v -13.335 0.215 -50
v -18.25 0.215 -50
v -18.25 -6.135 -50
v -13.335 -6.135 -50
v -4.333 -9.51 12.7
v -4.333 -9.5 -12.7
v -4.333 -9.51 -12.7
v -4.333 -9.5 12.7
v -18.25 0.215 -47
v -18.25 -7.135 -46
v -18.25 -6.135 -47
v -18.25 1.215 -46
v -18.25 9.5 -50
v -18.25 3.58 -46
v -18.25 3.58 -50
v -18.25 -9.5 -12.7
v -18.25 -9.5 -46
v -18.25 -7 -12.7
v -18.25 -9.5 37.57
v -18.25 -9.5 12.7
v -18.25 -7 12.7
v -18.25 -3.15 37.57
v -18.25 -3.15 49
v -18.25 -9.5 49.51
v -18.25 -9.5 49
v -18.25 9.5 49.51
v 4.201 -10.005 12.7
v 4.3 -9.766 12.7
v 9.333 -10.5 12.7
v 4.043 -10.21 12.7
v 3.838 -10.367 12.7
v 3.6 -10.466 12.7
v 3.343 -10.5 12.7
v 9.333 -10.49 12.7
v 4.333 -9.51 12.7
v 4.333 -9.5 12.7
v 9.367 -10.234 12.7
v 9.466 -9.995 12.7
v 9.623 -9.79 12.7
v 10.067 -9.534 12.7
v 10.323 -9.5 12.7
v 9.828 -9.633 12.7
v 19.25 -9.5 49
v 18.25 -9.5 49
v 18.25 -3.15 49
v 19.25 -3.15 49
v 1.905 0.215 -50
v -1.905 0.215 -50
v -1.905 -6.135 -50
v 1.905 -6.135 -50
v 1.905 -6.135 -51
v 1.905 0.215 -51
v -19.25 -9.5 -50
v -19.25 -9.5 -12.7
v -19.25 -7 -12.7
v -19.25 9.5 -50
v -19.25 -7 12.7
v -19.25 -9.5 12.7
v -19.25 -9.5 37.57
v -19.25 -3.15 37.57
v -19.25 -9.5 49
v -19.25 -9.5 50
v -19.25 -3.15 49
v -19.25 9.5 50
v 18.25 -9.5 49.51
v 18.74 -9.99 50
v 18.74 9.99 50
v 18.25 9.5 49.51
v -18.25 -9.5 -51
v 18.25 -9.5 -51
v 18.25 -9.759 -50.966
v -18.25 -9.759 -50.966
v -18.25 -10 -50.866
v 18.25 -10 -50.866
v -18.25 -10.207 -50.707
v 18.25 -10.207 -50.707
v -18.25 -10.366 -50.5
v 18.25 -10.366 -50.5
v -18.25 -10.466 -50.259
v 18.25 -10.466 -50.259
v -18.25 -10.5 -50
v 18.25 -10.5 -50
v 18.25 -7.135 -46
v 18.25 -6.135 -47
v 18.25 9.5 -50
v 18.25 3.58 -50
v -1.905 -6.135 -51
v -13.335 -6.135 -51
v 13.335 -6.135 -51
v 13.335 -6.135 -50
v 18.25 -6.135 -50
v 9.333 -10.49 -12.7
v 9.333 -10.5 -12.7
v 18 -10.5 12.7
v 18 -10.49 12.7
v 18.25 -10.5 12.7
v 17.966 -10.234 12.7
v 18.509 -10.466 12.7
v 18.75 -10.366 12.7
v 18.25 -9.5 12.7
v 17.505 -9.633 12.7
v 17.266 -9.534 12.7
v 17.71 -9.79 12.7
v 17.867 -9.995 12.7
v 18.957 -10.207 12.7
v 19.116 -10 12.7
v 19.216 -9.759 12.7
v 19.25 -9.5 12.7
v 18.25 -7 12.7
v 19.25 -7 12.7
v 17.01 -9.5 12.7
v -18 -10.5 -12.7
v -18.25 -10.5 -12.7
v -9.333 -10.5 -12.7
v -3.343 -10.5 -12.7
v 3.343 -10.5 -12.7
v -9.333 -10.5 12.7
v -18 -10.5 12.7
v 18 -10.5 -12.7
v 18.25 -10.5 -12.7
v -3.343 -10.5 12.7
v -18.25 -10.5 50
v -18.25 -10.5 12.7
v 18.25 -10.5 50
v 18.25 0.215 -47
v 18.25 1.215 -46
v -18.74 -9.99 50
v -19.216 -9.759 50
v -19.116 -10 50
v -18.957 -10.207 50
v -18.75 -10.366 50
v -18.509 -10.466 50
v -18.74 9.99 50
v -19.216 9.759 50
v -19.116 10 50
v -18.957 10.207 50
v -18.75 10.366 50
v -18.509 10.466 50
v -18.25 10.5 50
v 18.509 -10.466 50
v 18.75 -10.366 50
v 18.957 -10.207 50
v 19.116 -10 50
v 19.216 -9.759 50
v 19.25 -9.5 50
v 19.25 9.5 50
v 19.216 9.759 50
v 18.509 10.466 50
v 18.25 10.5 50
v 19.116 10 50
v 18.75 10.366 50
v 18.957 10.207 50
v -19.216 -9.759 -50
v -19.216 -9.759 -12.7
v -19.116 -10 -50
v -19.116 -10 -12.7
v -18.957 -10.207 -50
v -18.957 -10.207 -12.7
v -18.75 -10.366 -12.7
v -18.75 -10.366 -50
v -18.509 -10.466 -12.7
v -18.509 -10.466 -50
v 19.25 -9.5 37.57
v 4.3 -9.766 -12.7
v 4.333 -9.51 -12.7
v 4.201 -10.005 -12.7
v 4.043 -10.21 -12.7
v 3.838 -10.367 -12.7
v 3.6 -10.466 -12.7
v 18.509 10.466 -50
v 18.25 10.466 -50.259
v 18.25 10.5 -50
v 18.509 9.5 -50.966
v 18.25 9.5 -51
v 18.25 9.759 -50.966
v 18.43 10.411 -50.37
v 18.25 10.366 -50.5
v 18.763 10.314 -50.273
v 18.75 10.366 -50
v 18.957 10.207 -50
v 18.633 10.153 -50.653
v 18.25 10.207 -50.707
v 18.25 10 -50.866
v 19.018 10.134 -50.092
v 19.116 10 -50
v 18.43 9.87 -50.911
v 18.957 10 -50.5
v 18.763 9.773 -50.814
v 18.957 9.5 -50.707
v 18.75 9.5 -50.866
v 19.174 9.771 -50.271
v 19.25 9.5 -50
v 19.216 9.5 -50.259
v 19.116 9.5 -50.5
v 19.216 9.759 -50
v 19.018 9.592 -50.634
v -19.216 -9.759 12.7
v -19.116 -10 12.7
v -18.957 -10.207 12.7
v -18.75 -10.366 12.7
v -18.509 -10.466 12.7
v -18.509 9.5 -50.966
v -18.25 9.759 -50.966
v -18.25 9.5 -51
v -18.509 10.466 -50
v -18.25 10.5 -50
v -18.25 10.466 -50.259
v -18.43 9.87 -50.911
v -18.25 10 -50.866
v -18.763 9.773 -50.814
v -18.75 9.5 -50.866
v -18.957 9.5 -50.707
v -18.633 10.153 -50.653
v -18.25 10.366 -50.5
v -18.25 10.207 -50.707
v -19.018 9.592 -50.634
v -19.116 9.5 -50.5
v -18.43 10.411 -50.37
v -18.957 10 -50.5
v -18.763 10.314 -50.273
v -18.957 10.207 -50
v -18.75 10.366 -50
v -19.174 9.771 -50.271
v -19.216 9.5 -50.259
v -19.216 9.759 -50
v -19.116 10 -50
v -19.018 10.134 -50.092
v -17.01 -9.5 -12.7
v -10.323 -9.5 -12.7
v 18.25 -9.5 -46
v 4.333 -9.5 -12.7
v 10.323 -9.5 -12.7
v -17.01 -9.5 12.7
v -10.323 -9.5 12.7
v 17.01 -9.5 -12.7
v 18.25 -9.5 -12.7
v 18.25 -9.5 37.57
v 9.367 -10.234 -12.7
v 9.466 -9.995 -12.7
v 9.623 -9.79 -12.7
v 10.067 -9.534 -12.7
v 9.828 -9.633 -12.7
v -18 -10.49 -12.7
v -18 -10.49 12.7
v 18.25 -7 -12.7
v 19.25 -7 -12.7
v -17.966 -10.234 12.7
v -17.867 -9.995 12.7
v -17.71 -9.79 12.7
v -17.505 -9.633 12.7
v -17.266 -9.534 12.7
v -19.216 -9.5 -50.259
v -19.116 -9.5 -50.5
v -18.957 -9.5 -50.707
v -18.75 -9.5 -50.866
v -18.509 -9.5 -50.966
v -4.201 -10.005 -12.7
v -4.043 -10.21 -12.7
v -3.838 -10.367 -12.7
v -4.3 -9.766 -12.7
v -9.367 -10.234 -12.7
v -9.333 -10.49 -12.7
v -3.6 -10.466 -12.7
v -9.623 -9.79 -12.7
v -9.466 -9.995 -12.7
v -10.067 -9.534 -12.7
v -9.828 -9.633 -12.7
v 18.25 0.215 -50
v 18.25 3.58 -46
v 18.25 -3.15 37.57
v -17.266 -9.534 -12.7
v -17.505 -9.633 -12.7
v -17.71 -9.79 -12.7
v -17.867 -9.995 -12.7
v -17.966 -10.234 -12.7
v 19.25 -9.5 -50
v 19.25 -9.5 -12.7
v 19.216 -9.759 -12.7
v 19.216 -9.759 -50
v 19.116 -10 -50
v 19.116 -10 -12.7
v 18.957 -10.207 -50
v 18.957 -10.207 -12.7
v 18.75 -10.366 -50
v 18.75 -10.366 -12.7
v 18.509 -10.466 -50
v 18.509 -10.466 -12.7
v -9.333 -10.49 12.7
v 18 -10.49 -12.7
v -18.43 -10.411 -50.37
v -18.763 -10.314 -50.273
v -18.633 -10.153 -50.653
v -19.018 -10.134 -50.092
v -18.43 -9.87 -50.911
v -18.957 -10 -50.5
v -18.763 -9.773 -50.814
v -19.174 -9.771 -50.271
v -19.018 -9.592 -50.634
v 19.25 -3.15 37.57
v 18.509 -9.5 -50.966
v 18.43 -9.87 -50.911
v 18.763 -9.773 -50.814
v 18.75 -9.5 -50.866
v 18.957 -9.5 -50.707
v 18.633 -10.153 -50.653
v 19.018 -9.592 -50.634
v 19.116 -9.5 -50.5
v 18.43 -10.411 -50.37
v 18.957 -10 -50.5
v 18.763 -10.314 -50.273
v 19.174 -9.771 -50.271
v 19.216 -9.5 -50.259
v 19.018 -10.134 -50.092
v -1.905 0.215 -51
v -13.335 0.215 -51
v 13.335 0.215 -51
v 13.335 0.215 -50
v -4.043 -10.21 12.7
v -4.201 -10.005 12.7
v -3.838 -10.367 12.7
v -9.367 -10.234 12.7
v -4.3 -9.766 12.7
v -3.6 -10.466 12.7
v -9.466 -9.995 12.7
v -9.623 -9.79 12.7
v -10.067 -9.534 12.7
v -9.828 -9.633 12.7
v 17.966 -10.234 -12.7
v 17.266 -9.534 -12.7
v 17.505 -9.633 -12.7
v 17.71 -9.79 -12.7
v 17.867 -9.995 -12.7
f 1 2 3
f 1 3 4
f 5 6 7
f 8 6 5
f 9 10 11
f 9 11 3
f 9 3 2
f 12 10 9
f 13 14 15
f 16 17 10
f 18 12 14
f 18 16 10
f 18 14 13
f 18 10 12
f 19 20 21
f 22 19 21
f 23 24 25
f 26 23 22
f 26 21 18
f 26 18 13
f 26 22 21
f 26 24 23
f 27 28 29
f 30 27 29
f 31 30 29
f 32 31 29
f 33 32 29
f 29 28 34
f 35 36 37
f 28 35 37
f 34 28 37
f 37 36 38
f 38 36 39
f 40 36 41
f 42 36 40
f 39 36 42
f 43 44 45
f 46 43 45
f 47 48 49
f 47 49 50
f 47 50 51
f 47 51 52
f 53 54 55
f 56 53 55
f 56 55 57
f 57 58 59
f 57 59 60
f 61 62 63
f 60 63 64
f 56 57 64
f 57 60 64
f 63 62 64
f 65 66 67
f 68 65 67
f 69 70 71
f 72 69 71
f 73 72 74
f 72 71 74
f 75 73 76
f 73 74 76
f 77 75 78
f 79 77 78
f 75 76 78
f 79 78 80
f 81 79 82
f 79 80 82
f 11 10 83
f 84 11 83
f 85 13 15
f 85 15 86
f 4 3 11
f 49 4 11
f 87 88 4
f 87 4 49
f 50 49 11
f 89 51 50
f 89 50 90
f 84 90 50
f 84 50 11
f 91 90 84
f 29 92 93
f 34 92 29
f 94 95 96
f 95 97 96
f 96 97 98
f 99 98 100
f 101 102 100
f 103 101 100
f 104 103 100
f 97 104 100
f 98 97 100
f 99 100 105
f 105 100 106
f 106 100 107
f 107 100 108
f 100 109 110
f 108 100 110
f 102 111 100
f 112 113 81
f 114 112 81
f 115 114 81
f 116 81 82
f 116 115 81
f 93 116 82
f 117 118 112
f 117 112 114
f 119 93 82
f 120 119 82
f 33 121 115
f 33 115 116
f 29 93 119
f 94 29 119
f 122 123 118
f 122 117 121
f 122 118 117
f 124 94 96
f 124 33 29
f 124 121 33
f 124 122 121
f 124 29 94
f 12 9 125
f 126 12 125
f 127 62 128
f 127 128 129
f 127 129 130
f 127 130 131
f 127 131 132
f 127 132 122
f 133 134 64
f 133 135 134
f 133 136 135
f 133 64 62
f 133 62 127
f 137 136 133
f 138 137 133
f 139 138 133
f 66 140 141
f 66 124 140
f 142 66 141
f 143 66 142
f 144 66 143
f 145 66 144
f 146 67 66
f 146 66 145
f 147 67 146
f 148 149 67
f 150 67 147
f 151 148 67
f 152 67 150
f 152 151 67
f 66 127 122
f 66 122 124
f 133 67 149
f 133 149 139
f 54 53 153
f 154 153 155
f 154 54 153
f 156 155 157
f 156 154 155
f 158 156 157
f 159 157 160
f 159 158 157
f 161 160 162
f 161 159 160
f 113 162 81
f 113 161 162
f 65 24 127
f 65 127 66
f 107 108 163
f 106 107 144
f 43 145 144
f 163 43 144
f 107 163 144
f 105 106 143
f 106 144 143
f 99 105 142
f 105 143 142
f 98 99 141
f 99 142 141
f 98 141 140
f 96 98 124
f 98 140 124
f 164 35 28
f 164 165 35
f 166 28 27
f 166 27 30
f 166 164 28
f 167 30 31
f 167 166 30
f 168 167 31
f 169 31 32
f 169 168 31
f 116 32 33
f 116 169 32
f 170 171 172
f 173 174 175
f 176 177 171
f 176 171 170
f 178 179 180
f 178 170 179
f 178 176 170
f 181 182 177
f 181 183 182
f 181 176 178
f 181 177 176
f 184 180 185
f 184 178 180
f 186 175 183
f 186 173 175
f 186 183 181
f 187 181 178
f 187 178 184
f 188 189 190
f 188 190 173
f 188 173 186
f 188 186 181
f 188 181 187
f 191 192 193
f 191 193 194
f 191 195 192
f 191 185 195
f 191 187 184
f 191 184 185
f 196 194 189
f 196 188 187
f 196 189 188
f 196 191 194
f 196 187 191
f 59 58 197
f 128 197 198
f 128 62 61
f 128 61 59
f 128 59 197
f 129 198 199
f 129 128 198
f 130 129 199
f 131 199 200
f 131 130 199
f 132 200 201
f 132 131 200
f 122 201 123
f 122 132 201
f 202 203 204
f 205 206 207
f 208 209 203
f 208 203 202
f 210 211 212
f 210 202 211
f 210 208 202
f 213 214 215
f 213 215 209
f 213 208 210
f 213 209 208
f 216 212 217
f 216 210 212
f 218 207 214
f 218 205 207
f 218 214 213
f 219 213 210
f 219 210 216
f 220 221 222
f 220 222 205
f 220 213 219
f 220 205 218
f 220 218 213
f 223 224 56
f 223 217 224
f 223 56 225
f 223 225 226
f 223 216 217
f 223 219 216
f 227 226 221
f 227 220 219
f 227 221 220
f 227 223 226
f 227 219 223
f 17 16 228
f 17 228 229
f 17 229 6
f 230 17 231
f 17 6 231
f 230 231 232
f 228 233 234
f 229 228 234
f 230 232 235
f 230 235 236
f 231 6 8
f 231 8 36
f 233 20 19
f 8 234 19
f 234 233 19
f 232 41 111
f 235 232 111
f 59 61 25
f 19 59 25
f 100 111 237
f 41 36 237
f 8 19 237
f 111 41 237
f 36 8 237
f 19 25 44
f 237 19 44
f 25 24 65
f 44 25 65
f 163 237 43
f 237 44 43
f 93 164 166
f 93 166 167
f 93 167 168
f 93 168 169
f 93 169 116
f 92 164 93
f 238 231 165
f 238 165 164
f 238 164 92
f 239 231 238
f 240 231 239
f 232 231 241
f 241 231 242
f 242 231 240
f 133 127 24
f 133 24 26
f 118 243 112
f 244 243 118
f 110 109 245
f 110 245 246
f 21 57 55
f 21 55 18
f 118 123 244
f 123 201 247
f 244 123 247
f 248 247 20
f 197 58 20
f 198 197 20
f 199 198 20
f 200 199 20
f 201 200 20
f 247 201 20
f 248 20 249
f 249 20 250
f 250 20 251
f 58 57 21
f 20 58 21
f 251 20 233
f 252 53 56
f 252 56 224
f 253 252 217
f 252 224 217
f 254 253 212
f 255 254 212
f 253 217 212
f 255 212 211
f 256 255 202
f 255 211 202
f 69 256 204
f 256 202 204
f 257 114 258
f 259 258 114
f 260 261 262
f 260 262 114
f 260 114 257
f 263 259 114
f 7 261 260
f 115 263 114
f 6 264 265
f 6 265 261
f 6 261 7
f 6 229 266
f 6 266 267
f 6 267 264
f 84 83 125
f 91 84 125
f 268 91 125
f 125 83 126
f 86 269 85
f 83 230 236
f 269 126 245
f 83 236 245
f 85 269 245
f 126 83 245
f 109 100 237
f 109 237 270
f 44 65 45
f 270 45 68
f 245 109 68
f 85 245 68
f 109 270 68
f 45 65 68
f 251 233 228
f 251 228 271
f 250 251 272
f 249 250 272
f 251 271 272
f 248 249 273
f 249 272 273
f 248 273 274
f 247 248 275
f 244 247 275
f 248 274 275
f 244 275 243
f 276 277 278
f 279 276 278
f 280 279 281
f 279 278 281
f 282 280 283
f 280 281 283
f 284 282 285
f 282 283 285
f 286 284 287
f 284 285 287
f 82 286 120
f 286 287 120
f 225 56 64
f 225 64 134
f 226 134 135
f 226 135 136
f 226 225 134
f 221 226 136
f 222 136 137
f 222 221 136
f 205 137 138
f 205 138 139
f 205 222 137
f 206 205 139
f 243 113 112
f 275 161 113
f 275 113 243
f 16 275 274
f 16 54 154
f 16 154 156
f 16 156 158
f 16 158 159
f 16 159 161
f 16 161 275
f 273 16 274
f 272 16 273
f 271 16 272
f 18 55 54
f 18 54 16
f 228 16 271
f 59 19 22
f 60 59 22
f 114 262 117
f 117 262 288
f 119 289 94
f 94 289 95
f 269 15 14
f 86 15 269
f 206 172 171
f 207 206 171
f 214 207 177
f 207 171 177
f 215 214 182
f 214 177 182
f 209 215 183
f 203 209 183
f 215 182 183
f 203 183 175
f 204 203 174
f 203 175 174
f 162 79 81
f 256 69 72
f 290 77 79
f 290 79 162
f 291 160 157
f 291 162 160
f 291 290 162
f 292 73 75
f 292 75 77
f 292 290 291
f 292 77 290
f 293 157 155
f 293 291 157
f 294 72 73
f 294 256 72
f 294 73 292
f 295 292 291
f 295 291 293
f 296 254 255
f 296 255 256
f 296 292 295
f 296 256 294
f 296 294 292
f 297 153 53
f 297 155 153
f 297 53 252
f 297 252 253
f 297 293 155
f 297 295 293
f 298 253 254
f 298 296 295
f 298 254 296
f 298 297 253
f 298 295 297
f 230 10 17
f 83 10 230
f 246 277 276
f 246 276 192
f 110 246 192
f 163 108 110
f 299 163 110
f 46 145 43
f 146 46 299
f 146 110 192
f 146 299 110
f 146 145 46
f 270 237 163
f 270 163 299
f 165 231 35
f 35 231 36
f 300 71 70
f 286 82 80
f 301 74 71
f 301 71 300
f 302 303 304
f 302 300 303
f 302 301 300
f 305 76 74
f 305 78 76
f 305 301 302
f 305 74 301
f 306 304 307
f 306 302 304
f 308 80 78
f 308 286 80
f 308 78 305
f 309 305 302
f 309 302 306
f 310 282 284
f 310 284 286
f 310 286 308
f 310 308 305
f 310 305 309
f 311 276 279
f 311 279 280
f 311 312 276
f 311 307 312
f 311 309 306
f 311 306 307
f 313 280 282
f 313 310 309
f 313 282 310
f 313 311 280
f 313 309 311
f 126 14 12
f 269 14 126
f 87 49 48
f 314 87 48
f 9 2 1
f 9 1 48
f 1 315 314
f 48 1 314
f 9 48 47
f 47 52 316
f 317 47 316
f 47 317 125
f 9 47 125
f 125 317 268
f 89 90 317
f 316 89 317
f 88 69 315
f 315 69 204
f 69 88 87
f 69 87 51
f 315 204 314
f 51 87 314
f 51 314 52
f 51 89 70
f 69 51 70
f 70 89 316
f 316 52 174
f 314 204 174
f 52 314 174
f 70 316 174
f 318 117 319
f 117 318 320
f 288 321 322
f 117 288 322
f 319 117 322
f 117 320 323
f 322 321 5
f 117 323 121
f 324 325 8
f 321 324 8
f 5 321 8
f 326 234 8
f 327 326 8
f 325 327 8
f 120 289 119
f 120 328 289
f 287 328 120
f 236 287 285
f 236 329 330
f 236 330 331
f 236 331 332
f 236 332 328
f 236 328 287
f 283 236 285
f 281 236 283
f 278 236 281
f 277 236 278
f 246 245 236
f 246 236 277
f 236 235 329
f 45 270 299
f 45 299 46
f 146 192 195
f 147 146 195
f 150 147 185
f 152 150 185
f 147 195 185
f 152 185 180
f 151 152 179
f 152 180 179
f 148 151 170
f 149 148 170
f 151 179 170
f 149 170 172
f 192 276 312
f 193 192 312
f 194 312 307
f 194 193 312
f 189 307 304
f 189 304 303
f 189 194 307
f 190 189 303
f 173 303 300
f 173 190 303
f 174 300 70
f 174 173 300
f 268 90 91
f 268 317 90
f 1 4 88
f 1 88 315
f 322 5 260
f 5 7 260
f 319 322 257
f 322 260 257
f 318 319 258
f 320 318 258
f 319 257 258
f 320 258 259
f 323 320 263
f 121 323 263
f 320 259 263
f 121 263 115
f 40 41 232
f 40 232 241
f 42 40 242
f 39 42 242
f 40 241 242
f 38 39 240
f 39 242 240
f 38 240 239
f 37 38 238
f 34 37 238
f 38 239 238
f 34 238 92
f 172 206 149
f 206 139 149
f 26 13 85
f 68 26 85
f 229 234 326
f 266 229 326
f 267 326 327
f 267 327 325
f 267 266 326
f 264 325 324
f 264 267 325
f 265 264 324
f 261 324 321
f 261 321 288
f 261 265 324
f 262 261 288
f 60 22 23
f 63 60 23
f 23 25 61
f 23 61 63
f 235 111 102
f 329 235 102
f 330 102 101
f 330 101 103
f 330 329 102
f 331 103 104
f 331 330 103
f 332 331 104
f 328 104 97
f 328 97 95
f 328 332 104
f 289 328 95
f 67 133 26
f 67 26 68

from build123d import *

# Parameters (mm, degrees)
SKETCH020_W          = 36.5
SKETCH020_H          = 19
PAD015_DEPTH         = 50
THICKNESS003_T       = 1
SKETCH021_W          = 11.43
SKETCH021_H          = 6.35
POCKET003_DEPTH      = 51.001
SKETCH022_W          = 6.35
SKETCH022_H          = 11.43
POCKET004_DEPTH      = 19.251
POCKET004_DEPTH_BACK = 19.251
SKETCH028_W          = 10
SKETCH028_H          = 25.4
SKETCH028_W_2        = 5
POCKET005_DEPTH      = 5
FILLET006_R          = 0.99
SKETCH034_W          = 36.5
SKETCH034_H          = 3.365
PAD021_DEPTH         = 4
CHAMFER_SIZE         = 1
CHAMFER001_SIZE      = 0.49


with BuildPart() as part:
    # Sketch020 → Pad015 (new body, symmetric)
    with BuildSketch(Plane.XY):
        Rectangle(SKETCH020_W, SKETCH020_H)
    extrude(amount=PAD015_DEPTH, both=True)

    # Thickness003
    thickness003_openings = [part.faces().sort_by_distance(p)[0] for p in [
        (0, 0, 50),
    ]]
    offset(amount=THICKNESS003_T, openings=thickness003_openings)

    # Sketch021 → Pocket003 (cut, through all)
    with BuildSketch(Plane.XY):
        with Locations((7.62, -2.96)):
            Rectangle(SKETCH021_W, SKETCH021_H)
        with Locations((-7.62, -2.96)):
            Rectangle(SKETCH021_W, SKETCH021_H)
    extrude(amount=-POCKET003_DEPTH, mode=Mode.SUBTRACT)

    # Sketch022 → Pocket004 (cut, two sides)
    with BuildSketch(Plane.YZ) as pocket004_sk:
        with Locations((-6.325, 43.285)):
            Rectangle(SKETCH022_W, SKETCH022_H)
    extrude(amount=-POCKET004_DEPTH, mode=Mode.SUBTRACT)
    extrude(pocket004_sk.sketch, amount=POCKET004_DEPTH_BACK, mode=Mode.SUBTRACT)

    # Sketch028 → Pocket005 (cut)
    with BuildSketch(Plane.XZ.offset(7)):
        with Locations((-23, 0)):
            Rectangle(SKETCH028_W, SKETCH028_H)
        with Locations((23, 0)):
            Rectangle(SKETCH028_W, SKETCH028_H)
        with Locations((-6.833333, 0)):
            Rectangle(SKETCH028_W_2, SKETCH028_H)
        with Locations((6.833333, 0)):
            Rectangle(SKETCH028_W_2, SKETCH028_H)
    extrude(amount=POCKET005_DEPTH, mode=Mode.SUBTRACT)

    # Fillet006
    fillet006_edges = [part.edges().sort_by_distance(p)[0] for p in [
        (-18, -9.5, 0),
        (-9.333333, -9.5, 0),
        (-4.333333, -10.5, 0),
        (4.333333, -10.5, 0),
        (9.333333, -9.5, 0),
        (18, -9.5, 0),
    ]]
    fillet(fillet006_edges, radius=FILLET006_R)

    # Sketch034 → Pad021 (join)
    with BuildSketch(Plane.XY.offset(-50)):
        with Locations((0, -7.8175)):
            Rectangle(SKETCH034_W, SKETCH034_H)
        with Locations((0, 1.8975)):
            Rectangle(SKETCH034_W, SKETCH034_H)
    extrude(amount=PAD021_DEPTH)

    # Chamfer
    chamfer_edges = [part.edges().sort_by_distance(p)[0] for p in [
        (0, 0.215, -46),
        (0, -6.135, -46),
    ]]
    chamfer(chamfer_edges, length=CHAMFER_SIZE)

    # Chamfer001
    chamfer001_edges = [part.edges().sort_by_distance(p)[0] for p in [
        (0, -9.5, 50),
        (-18.25, 0, 50),
        (0, 9.5, 50),
        (18.25, 0, 50),
    ]]
    chamfer(chamfer001_edges, length=CHAMFER001_SIZE)


solid = part.part
